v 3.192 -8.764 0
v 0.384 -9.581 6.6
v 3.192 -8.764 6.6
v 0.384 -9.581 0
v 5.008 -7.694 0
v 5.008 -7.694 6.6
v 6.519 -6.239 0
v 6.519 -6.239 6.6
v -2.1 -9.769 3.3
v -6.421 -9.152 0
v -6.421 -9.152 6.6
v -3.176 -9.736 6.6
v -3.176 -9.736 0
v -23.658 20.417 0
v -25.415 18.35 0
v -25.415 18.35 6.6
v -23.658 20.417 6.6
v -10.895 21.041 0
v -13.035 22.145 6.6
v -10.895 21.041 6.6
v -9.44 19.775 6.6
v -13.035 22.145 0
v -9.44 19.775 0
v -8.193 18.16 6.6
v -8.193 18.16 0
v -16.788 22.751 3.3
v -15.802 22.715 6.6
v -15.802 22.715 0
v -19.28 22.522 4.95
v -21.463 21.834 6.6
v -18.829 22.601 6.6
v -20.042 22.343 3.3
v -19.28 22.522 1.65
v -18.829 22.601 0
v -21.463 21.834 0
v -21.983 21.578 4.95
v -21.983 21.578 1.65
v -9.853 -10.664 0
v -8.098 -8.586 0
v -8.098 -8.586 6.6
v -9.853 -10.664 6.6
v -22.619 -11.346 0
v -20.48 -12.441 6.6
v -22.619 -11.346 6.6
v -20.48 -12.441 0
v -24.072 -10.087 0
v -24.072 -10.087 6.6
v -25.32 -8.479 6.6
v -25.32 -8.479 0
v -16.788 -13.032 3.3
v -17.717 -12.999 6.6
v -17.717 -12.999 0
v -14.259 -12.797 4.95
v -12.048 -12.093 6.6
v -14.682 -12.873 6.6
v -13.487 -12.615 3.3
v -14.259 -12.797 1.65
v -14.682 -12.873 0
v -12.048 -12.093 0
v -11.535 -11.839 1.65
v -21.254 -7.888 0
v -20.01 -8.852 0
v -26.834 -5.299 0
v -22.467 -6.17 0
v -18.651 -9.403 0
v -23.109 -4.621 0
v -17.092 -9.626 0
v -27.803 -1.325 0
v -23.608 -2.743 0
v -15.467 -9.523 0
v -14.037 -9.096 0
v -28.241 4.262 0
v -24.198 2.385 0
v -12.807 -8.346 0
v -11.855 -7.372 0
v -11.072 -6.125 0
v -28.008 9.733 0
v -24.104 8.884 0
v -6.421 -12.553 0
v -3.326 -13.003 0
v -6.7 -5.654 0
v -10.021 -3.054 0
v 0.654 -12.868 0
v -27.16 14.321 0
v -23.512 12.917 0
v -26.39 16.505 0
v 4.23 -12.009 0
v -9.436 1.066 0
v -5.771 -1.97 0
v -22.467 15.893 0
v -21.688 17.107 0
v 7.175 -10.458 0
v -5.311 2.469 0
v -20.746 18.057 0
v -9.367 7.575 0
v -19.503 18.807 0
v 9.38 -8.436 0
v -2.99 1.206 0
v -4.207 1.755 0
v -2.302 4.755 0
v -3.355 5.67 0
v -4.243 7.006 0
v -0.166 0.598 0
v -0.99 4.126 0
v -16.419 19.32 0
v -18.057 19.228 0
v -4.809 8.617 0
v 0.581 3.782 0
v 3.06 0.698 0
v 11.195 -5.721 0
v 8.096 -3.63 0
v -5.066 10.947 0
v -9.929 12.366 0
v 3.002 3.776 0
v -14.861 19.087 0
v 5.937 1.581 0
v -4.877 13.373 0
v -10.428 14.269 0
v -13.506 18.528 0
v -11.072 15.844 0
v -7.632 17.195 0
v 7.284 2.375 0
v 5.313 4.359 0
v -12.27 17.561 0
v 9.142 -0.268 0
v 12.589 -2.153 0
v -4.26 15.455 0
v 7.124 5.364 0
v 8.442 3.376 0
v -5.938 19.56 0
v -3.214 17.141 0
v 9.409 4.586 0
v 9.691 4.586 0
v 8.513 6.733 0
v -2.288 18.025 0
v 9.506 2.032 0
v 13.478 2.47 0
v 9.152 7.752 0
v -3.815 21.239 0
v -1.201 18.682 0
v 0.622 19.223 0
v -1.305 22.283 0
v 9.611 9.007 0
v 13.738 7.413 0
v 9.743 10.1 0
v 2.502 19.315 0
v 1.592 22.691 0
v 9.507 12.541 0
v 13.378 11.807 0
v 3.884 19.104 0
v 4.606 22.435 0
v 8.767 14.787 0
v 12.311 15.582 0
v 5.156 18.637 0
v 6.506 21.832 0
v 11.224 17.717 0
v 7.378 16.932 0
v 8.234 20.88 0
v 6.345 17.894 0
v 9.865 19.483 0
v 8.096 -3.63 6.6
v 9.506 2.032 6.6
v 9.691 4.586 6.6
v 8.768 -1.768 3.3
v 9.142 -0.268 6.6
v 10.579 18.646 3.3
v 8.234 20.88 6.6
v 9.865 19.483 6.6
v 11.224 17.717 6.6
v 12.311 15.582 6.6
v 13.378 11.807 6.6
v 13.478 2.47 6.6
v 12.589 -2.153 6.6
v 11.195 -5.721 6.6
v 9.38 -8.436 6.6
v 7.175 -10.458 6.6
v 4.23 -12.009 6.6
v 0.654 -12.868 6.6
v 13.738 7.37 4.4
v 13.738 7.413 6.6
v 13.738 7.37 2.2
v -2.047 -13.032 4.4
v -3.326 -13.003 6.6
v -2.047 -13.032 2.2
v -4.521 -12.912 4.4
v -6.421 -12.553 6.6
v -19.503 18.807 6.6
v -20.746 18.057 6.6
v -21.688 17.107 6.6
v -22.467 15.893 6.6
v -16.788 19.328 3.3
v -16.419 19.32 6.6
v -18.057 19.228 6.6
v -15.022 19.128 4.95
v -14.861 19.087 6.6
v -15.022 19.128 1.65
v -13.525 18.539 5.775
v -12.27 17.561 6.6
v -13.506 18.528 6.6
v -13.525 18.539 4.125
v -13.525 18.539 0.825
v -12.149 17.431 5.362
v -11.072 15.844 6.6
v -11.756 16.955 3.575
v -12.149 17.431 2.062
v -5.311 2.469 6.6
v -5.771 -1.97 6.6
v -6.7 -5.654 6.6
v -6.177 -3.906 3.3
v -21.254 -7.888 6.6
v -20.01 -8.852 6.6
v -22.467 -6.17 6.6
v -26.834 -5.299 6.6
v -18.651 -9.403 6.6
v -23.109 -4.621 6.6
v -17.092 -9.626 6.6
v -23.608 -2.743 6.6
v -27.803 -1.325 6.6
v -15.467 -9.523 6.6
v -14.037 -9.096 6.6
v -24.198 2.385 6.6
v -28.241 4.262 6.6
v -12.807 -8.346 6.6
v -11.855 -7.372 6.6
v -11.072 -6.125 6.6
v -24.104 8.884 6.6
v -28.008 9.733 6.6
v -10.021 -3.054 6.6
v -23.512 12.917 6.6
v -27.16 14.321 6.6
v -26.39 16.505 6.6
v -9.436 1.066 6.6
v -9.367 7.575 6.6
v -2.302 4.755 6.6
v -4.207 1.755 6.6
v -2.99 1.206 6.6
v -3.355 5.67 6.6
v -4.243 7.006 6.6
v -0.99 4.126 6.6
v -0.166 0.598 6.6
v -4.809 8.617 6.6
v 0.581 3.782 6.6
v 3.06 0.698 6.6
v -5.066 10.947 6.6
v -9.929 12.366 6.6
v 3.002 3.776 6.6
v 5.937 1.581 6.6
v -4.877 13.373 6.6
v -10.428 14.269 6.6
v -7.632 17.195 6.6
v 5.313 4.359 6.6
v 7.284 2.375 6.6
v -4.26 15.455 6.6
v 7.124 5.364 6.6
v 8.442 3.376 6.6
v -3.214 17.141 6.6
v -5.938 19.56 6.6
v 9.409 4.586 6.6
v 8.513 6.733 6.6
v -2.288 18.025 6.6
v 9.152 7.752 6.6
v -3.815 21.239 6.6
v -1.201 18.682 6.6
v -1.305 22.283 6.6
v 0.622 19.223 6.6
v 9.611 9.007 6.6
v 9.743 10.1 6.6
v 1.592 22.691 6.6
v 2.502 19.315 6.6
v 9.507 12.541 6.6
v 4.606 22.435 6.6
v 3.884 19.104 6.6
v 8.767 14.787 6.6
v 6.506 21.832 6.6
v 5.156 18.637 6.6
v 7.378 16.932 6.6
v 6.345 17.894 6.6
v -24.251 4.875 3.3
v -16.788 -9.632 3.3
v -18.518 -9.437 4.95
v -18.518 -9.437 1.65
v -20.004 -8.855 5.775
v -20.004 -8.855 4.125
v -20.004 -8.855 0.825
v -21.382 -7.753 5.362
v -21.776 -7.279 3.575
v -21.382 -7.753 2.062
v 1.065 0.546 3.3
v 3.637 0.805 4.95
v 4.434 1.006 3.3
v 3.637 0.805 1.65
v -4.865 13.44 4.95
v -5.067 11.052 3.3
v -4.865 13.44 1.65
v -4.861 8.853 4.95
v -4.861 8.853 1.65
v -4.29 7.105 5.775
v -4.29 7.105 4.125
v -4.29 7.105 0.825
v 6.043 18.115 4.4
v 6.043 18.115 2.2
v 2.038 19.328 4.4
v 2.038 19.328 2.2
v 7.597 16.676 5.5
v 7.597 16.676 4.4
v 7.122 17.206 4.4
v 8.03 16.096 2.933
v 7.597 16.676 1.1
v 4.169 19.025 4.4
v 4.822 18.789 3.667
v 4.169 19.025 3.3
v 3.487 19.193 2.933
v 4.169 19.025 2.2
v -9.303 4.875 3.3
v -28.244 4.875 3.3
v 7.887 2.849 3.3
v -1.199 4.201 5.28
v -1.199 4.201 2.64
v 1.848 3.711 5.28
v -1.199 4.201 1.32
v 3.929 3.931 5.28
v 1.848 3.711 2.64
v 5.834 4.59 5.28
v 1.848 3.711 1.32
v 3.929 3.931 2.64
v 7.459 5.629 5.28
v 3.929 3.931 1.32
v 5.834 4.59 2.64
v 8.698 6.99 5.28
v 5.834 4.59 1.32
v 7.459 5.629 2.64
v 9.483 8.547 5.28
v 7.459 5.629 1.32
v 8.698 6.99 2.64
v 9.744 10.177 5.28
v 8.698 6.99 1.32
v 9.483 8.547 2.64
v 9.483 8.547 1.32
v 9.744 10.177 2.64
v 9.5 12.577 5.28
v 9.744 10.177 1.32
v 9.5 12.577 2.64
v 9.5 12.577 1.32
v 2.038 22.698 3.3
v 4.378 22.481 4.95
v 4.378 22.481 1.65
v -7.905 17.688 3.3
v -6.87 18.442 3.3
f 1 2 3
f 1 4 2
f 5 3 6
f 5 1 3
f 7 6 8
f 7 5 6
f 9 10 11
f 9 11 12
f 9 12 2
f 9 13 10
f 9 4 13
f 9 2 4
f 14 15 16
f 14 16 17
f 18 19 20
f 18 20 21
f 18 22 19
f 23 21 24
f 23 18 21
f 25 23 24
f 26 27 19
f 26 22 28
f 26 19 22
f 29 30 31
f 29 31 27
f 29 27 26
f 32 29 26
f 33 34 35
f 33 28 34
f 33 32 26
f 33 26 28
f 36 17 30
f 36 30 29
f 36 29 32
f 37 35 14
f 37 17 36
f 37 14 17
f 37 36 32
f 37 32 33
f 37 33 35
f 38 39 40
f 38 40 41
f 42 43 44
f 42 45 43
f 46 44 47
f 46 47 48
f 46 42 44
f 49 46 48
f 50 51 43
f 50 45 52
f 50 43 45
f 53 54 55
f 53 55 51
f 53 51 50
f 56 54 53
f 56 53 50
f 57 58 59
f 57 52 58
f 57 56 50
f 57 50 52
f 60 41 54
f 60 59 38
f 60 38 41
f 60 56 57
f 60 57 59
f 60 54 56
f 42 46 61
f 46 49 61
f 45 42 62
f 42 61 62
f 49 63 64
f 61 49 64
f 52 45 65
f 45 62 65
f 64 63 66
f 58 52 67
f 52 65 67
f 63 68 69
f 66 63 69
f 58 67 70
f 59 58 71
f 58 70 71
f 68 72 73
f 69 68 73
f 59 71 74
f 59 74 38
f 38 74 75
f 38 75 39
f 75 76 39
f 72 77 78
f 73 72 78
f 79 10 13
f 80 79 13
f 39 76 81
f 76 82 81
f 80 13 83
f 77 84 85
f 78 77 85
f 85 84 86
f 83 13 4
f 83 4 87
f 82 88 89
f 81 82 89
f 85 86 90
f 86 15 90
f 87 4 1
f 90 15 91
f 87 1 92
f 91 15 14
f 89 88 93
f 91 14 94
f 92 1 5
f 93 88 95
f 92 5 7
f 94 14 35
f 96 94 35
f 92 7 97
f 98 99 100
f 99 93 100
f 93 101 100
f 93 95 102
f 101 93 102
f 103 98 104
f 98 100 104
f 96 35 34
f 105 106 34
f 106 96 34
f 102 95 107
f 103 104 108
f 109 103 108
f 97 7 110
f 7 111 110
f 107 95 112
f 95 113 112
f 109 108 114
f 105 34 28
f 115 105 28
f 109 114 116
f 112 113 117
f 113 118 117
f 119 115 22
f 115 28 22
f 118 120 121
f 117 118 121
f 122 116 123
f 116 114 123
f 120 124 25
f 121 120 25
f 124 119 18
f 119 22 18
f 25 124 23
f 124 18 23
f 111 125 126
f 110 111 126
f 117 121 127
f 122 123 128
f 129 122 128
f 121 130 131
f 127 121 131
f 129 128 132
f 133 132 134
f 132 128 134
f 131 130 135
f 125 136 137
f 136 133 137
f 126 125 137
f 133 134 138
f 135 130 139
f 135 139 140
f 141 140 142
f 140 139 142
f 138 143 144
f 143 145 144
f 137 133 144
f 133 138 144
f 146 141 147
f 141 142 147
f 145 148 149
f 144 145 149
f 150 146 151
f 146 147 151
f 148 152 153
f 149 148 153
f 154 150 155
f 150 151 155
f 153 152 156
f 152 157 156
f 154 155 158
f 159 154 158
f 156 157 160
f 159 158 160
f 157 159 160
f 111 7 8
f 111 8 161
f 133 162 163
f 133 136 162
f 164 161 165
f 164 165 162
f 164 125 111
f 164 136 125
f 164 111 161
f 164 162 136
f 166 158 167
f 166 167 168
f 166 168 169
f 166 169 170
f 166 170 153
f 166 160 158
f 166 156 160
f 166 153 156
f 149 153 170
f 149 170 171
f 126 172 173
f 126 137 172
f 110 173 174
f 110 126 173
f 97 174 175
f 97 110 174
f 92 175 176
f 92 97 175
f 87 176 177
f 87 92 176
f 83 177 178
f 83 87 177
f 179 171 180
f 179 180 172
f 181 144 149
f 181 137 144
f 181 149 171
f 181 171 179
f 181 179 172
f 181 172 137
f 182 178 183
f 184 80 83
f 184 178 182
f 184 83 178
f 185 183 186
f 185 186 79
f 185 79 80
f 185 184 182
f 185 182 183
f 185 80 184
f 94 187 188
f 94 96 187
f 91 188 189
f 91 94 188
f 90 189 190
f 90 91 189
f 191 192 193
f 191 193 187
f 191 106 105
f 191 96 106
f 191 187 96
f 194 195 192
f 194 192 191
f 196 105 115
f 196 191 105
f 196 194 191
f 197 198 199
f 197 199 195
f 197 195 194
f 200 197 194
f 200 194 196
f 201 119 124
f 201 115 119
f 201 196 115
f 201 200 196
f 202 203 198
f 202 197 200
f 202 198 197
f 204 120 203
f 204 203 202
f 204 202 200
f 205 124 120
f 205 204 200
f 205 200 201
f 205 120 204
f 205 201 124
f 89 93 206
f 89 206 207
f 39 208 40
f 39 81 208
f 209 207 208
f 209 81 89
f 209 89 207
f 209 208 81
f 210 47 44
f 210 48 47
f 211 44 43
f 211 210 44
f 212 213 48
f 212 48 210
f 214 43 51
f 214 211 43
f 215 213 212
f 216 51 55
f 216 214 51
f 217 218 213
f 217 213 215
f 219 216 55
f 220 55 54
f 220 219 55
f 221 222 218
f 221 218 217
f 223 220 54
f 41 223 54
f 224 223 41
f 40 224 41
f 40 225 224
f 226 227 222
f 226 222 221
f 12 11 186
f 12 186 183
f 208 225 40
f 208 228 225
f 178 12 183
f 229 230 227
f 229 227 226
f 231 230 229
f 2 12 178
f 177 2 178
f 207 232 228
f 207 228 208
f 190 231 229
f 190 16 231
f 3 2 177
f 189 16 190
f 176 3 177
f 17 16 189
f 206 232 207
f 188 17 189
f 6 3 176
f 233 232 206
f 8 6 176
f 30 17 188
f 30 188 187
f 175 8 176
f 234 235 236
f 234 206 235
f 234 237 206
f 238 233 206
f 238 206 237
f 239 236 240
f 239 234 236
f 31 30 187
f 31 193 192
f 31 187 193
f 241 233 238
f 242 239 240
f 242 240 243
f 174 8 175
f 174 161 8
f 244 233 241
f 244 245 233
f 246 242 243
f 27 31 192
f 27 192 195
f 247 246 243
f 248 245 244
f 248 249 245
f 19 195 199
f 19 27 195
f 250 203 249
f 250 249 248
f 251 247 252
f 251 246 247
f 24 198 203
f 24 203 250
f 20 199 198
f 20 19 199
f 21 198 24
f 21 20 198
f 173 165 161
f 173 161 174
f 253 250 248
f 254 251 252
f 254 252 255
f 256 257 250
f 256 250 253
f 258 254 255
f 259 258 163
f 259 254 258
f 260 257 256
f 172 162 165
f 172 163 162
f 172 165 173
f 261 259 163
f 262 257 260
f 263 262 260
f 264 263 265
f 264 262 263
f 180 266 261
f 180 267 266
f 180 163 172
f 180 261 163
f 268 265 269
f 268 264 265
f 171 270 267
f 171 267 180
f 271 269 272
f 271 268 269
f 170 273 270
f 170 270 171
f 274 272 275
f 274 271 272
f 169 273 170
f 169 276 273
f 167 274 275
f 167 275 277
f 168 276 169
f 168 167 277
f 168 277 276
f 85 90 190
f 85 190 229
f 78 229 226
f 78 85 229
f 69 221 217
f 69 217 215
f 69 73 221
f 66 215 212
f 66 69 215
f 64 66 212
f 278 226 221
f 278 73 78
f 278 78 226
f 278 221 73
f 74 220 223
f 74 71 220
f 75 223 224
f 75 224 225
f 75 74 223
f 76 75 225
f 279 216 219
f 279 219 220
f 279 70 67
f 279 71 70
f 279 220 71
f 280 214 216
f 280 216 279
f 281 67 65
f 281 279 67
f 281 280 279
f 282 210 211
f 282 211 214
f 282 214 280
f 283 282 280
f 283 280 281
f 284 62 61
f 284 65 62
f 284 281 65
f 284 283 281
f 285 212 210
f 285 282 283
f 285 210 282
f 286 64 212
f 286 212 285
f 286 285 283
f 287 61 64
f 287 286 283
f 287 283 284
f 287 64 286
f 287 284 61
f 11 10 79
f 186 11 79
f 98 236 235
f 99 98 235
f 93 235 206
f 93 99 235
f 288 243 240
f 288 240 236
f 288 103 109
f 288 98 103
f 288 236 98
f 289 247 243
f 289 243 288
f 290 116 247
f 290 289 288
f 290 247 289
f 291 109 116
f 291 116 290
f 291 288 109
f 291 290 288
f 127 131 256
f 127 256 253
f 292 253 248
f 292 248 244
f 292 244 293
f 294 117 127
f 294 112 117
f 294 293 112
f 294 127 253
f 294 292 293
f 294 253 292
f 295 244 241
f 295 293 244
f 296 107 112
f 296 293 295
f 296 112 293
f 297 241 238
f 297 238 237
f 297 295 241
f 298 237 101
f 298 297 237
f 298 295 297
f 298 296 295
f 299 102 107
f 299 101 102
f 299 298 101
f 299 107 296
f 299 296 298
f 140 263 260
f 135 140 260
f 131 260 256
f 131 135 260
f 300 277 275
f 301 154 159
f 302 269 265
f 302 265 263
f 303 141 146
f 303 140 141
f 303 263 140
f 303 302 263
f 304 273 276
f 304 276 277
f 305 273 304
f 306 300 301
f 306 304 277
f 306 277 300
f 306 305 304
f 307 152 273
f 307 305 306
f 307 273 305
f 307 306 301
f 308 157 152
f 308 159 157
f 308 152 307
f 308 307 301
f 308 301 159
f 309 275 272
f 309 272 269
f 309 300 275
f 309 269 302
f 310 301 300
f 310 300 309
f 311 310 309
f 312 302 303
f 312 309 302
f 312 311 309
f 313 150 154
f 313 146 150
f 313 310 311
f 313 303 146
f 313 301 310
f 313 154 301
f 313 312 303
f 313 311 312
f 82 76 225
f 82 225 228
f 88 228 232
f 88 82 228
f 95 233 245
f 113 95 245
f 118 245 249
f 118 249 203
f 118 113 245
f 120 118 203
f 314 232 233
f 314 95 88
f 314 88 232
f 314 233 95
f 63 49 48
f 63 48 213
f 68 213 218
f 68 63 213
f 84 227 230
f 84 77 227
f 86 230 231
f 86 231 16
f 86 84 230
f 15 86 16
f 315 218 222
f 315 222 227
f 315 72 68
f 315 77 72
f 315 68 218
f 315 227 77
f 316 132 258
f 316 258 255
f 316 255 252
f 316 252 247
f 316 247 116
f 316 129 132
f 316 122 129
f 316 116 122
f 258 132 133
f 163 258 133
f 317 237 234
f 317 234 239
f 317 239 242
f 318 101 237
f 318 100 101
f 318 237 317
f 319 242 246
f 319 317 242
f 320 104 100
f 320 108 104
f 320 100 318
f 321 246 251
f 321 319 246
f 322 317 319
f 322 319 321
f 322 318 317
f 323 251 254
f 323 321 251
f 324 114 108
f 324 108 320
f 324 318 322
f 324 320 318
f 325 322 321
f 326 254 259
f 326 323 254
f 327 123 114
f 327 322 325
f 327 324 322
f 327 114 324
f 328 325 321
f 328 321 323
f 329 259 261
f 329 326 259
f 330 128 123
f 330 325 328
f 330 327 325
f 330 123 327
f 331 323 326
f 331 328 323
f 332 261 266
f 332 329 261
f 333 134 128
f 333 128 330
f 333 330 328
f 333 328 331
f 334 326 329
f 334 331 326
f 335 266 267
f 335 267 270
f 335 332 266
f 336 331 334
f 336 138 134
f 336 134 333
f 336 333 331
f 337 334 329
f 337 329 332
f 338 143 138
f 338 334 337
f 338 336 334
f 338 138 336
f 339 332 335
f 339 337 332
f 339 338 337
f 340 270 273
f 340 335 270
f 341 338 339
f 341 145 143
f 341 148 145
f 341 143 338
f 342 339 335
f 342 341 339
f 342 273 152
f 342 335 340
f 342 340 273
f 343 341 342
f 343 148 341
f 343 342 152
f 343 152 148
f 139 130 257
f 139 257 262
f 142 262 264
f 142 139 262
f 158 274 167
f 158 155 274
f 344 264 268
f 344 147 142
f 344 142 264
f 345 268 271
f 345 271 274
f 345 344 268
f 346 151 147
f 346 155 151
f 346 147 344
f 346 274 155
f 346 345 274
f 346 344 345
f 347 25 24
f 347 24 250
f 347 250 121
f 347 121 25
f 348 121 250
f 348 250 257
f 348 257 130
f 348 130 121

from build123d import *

# Parameters (mm, degrees)
F1_DEPTH = 6.6


with BuildPart() as f1:
    # F0 (on Top) → F1 (new body)
    with BuildSketch(Plane.XY):
        with BuildLine():
            add(Edge.make_bspline(
                [(-7.6317636007, 17.1954130546), (-5.2563737417, 12.6951079756), (-5.2563737417, 4.8747955678)],
                knots=[0.1005651291, 0.1005651291, 0.1005651291, 1, 1, 1], degree=2))
            add(Edge.make_bspline(
                [(-5.2563737417, 4.8747955678), (-5.2563737417, 3.6283314587), (-5.310699439, 2.4692102714)],
                knots=[0, 0, 0, 0.1382780595, 0.1382780595, 0.1382780595], degree=2))
            add(Edge.make_bspline(
                [(1.0645534445, 0.5464650409), (-2.7847625628, 0.5464650409), (-5.310699439, 2.4692102714)],
                knots=[0, 0, 0, 0.8350313684, 0.8350313684, 0.8350313684], degree=2))
            add(Edge.make_bspline(
                [(5.9367778777, 1.581004499), (3.7726126142, 0.5464650409), (1.0645534445, 0.5464650409)],
                knots=[0, 0, 0, 1, 1, 1], degree=2))
            add(Edge.make_bspline(
                [(9.4093312792, 4.5857330721), (8.1009431411, 2.6155439571), (5.9367778777, 1.581004499)],
                knots=[0, 0, 0, 1, 1, 1], degree=2))
            Line((9.4093312792, 4.5857330721), (9.6907868671, 4.5857330721))
            add(Edge.make_bspline(
                [(6.5187063228, -6.2388966989), (9.4321520026, -2.7092914889), (9.6907868671, 4.5857330721)],
                knots=[0, 0, 0, 1, 1, 1], degree=2))
            add(Edge.make_bspline(
                [(-2.0999201919, -9.7685019088), (3.6052606431, -9.7685019088), (6.5187063228, -6.2388966989)],
                knots=[0, 0, 0, 1, 1, 1], degree=2))
            add(Edge.make_bspline(
                [(-6.420643811, -9.1523423786), (-4.518916866, -9.7685019088), (-2.0999201919, -9.7685019088)],
                knots=[0, 0, 0, 1, 1, 1], degree=2))
            Line((-6.420643811, -9.1523423786), (-6.420643811, -12.5526301563))
            add(Edge.make_bspline(
                [(-2.0466718375, -13.0318653464), (-4.8079793616, -13.0318653464), (-6.420643811, -12.5526301563)],
                knots=[0, 0, 0, 1, 1, 1], degree=2))
            add(Edge.make_bspline(
                [(13.7376618061, 7.3698613196), (13.7376618061, -13.0318653464), (-2.0466718375, -13.0318653464)],
                knots=[0, 0, 0, 1, 1, 1], degree=2))
            add(Edge.make_bspline(
                [(12.3113665973, 15.5815182681), (13.7376618061, 12.1013579588), (13.7376618061, 7.3698613196)],
                knots=[0, 0, 0, 1, 1, 1], degree=2))
            add(Edge.make_bspline(
                [(8.2340640272, 20.8797295369), (10.8850713886, 19.0616785775), (12.3113665973, 15.5815182681)],
                knots=[0, 0, 0, 1, 1, 1], degree=2))
            add(Edge.make_bspline(
                [(2.0382376404, 22.6977804964), (5.5830566659, 22.6977804964), (8.2340640272, 20.8797295369)],
                knots=[0, 0, 0, 1, 1, 1], degree=2))
            add(Edge.make_bspline(
                [(-5.937605167, 19.5599310371), (-2.9062524166, 22.6977804964), (2.0382376404, 22.6977804964)],
                knots=[0, 0, 0, 1, 1, 1], degree=2))
            add(Edge.make_bspline(
                [(-7.6317636007, 17.1954130546), (-6.9556254387, 18.5061459378), (-5.937605167, 19.5599310371)],
                knots=[0.6641696445, 0.6641696445, 0.6641696445, 1, 1, 1], degree=2))
        make_face()
        with BuildLine():
            add(Edge.make_bspline(
                [(2.0382376404, 19.3279203498), (-1.3620501373, 19.3279203498), (-3.2143321817, 17.140934363)],
                knots=[0, 0, 0, 1, 1, 1], degree=2))
            add(Edge.make_bspline(
                [(6.0432745866, 18.1146185589), (4.2974892511, 19.3279203498), (2.0382376404, 19.3279203498)],
                knots=[0, 0, 0, 1, 1, 1], degree=2))
            add(Edge.make_bspline(
                [(8.7665475718, 14.7865964051), (7.7890599221, 16.901316768), (6.0432745866, 18.1146185589)],
                knots=[0, 0, 0, 1, 1, 1], degree=2))
            add(Edge.make_bspline(
                [(9.7440352216, 10.1768102904), (9.7440352216, 12.6718760423), (8.7665475718, 14.7865964051)],
                knots=[0, 0, 0, 1, 1, 1], degree=2))
            add(Edge.make_bspline(
                [(8.6980854018, 6.9895159306), (9.7440352216, 8.5108974866), (9.7440352216, 10.1768102904)],
                knots=[0, 0, 0, 1, 1, 1], degree=2))
            add(Edge.make_bspline(
                [(5.8340846226, 4.589536526), (7.652135582, 5.4681343746), (8.6980854018, 6.9895159306)],
                knots=[0, 0, 0, 1, 1, 1], degree=2))
            add(Edge.make_bspline(
                [(1.8480649459, 3.7109386774), (4.0160336632, 3.7109386774), (5.8340846226, 4.589536526)],
                knots=[0, 0, 0, 1, 1, 1], degree=2))
            add(Edge.make_bspline(
                [(-3.3550599756, 5.6697174308), (-1.6435057251, 3.7109386774), (1.8480649459, 3.7109386774)],
                knots=[0, 0, 0, 1, 1, 1], degree=2))
            add(Edge.make_bspline(
                [(-5.0666142262, 11.0516046851), (-5.0666142262, 7.6284961841), (-3.3550599756, 5.6697174308)],
                knots=[0, 0, 0, 1, 1, 1], degree=2))
            add(Edge.make_bspline(
                [(-3.2143321817, 17.140934363), (-5.0666142262, 14.9539483763), (-5.0666142262, 11.0516046851)],
                knots=[0, 0, 0, 1, 1, 1], degree=2))
        make_face(mode=Mode.SUBTRACT)
        with BuildLine():
            add(Edge.make_bspline(
                [(-5.2563737417, 4.8747955678), (-5.2563737417, 3.6283314587), (-5.310699439, 2.4692102714)],
                knots=[0, 0, 0, 0.1382780595, 0.1382780595, 0.1382780595], degree=2))
            add(Edge.make_bspline(
                [(-7.6317636007, 17.1954130546), (-5.2563737417, 12.6951079756), (-5.2563737417, 4.8747955678)],
                knots=[0.1005651291, 0.1005651291, 0.1005651291, 1, 1, 1], degree=2))
            add(Edge.make_bspline(
                [(-8.9689579173, 11.0059632385), (-8.9689579173, 14.6031846306), (-7.6317636007, 17.1954130546)],
                knots=[0, 0, 0, 0.6641696445, 0.6641696445, 0.6641696445], degree=2))
            add(Edge.make_bspline(
                [(-6.2570952937, 3.3039691112), (-8.9689579173, 6.0614731814), (-8.9689579173, 11.0059632385)],
                knots=[0, 0, 0, 1, 1, 1], degree=2))
            add(Edge.make_bspline(
                [(-5.310699439, 2.4692102714), (-5.8097230276, 2.849067438), (-6.2570952937, 3.3039691112)],
                knots=[0.8350313684, 0.8350313684, 0.8350313684, 1, 1, 1], degree=2))
        make_face()
        with BuildLine():
            add(Edge.make_bspline(
                [(-5.310699439, 2.4692102714), (-5.6492466064, -4.7542072585), (-8.0975537975, -8.585627749)],
                knots=[0.1382780595, 0.1382780595, 0.1382780595, 1, 1, 1], degree=2))
            add(Edge.make_bspline(
                [(-5.310699439, 2.4692102714), (-5.8097230276, 2.849067438), (-6.2570952937, 3.3039691112)],
                knots=[0.8350313684, 0.8350313684, 0.8350313684, 1, 1, 1], degree=2))
            add(Edge.make_bspline(
                [(-6.2570952937, 3.3039691112), (-8.9689579173, 6.0614731814), (-8.9689579173, 11.0059632385)],
                knots=[0, 0, 0, 1, 1, 1], degree=2))
            add(Edge.make_bspline(
                [(-8.9689579173, 11.0059632385), (-8.9689579173, 14.6031846306), (-7.6317636007, 17.1954130546)],
                knots=[0, 0, 0, 0.6641696445, 0.6641696445, 0.6641696445], degree=2))
            add(Edge.make_bspline(
                [(-8.1926401447, 18.1602600056), (-7.8973541349, 17.698588744), (-7.6317636007, 17.1954130546)],
                knots=[0, 0, 0, 0.1005651291, 0.1005651291, 0.1005651291], degree=2))
            add(Edge.make_bspline(
                [(-16.7884459362, 22.7510288508), (-11.1289065478, 22.7510288508), (-8.1926401447, 18.1602600056)],
                knots=[0, 0, 0, 1, 1, 1], degree=2))
            add(Edge.make_bspline(
                [(-25.4146793587, 18.3504327001), (-22.5849096646, 22.7510288508), (-16.7884459362, 22.7510288508)],
                knots=[0, 0, 0, 1, 1, 1], degree=2))
            add(Edge.make_bspline(
                [(-28.2444490529, 4.8747955678), (-28.2444490529, 13.9498365493), (-25.4146793587, 18.3504327001)],
                knots=[0, 0, 0, 1, 1, 1], degree=2))
            add(Edge.make_bspline(
                [(-25.3195930115, -8.4791310401), (-28.2444490529, -3.9263967337), (-28.2444490529, 4.8747955678)],
                knots=[0, 0, 0, 1, 1, 1], degree=2))
            add(Edge.make_bspline(
                [(-16.7884459362, -13.0318653464), (-22.3947369701, -13.0318653464), (-25.3195930115, -8.4791310401)],
                knots=[0, 0, 0, 1, 1, 1], degree=2))
            add(Edge.make_bspline(
                [(-8.0975537975, -8.585627749), (-10.9387338533, -13.0318653464), (-16.7884459362, -13.0318653464)],
                knots=[0, 0, 0, 1, 1, 1], degree=2))
        make_face()
        with BuildLine():
            add(Edge.make_bspline(
                [(-24.2508224684, 4.8747955678), (-24.2508224684, -2.7092914889), (-22.467002594, -6.1704345288)],
                knots=[0, 0, 0, 1, 1, 1], degree=2))
            add(Edge.make_bspline(
                [(-22.467002594, 15.8934014871), (-24.2508224684, 12.4588826244), (-24.2508224684, 4.8747955678)],
                knots=[0, 0, 0, 1, 1, 1], degree=2))
            add(Edge.make_bspline(
                [(-16.7884459362, 19.3279203498), (-20.6831827195, 19.3279203498), (-22.467002594, 15.8934014871)],
                knots=[0, 0, 0, 1, 1, 1], degree=2))
            add(Edge.make_bspline(
                [(-11.0718547395, 15.8439565865), (-12.8404607983, 19.3279203498), (-16.7884459362, 19.3279203498)],
                knots=[0, 0, 0, 1, 1, 1], degree=2))
            add(Edge.make_bspline(
                [(-9.3032486806, 4.8747955678), (-9.3032486806, 12.3599928233), (-11.0718547395, 15.8439565865)],
                knots=[0, 0, 0, 1, 1, 1], degree=2))
            add(Edge.make_bspline(
                [(-11.0718547395, -6.1247930822), (-9.3032486806, -2.6180085956), (-9.3032486806, 4.8747955678)],
                knots=[0, 0, 0, 1, 1, 1], degree=2))
            add(Edge.make_bspline(
                [(-16.7884459362, -9.6315775687), (-12.8404607983, -9.6315775687), (-11.0718547395, -6.1247930822)],
                knots=[0, 0, 0, 1, 1, 1], degree=2))
            add(Edge.make_bspline(
                [(-22.467002594, -6.1704345288), (-20.6831827195, -9.6315775687), (-16.7884459362, -9.6315775687)],
                knots=[0, 0, 0, 1, 1, 1], degree=2))
        make_face(mode=Mode.SUBTRACT)
    extrude(amount=F1_DEPTH)


solid = f1.part
